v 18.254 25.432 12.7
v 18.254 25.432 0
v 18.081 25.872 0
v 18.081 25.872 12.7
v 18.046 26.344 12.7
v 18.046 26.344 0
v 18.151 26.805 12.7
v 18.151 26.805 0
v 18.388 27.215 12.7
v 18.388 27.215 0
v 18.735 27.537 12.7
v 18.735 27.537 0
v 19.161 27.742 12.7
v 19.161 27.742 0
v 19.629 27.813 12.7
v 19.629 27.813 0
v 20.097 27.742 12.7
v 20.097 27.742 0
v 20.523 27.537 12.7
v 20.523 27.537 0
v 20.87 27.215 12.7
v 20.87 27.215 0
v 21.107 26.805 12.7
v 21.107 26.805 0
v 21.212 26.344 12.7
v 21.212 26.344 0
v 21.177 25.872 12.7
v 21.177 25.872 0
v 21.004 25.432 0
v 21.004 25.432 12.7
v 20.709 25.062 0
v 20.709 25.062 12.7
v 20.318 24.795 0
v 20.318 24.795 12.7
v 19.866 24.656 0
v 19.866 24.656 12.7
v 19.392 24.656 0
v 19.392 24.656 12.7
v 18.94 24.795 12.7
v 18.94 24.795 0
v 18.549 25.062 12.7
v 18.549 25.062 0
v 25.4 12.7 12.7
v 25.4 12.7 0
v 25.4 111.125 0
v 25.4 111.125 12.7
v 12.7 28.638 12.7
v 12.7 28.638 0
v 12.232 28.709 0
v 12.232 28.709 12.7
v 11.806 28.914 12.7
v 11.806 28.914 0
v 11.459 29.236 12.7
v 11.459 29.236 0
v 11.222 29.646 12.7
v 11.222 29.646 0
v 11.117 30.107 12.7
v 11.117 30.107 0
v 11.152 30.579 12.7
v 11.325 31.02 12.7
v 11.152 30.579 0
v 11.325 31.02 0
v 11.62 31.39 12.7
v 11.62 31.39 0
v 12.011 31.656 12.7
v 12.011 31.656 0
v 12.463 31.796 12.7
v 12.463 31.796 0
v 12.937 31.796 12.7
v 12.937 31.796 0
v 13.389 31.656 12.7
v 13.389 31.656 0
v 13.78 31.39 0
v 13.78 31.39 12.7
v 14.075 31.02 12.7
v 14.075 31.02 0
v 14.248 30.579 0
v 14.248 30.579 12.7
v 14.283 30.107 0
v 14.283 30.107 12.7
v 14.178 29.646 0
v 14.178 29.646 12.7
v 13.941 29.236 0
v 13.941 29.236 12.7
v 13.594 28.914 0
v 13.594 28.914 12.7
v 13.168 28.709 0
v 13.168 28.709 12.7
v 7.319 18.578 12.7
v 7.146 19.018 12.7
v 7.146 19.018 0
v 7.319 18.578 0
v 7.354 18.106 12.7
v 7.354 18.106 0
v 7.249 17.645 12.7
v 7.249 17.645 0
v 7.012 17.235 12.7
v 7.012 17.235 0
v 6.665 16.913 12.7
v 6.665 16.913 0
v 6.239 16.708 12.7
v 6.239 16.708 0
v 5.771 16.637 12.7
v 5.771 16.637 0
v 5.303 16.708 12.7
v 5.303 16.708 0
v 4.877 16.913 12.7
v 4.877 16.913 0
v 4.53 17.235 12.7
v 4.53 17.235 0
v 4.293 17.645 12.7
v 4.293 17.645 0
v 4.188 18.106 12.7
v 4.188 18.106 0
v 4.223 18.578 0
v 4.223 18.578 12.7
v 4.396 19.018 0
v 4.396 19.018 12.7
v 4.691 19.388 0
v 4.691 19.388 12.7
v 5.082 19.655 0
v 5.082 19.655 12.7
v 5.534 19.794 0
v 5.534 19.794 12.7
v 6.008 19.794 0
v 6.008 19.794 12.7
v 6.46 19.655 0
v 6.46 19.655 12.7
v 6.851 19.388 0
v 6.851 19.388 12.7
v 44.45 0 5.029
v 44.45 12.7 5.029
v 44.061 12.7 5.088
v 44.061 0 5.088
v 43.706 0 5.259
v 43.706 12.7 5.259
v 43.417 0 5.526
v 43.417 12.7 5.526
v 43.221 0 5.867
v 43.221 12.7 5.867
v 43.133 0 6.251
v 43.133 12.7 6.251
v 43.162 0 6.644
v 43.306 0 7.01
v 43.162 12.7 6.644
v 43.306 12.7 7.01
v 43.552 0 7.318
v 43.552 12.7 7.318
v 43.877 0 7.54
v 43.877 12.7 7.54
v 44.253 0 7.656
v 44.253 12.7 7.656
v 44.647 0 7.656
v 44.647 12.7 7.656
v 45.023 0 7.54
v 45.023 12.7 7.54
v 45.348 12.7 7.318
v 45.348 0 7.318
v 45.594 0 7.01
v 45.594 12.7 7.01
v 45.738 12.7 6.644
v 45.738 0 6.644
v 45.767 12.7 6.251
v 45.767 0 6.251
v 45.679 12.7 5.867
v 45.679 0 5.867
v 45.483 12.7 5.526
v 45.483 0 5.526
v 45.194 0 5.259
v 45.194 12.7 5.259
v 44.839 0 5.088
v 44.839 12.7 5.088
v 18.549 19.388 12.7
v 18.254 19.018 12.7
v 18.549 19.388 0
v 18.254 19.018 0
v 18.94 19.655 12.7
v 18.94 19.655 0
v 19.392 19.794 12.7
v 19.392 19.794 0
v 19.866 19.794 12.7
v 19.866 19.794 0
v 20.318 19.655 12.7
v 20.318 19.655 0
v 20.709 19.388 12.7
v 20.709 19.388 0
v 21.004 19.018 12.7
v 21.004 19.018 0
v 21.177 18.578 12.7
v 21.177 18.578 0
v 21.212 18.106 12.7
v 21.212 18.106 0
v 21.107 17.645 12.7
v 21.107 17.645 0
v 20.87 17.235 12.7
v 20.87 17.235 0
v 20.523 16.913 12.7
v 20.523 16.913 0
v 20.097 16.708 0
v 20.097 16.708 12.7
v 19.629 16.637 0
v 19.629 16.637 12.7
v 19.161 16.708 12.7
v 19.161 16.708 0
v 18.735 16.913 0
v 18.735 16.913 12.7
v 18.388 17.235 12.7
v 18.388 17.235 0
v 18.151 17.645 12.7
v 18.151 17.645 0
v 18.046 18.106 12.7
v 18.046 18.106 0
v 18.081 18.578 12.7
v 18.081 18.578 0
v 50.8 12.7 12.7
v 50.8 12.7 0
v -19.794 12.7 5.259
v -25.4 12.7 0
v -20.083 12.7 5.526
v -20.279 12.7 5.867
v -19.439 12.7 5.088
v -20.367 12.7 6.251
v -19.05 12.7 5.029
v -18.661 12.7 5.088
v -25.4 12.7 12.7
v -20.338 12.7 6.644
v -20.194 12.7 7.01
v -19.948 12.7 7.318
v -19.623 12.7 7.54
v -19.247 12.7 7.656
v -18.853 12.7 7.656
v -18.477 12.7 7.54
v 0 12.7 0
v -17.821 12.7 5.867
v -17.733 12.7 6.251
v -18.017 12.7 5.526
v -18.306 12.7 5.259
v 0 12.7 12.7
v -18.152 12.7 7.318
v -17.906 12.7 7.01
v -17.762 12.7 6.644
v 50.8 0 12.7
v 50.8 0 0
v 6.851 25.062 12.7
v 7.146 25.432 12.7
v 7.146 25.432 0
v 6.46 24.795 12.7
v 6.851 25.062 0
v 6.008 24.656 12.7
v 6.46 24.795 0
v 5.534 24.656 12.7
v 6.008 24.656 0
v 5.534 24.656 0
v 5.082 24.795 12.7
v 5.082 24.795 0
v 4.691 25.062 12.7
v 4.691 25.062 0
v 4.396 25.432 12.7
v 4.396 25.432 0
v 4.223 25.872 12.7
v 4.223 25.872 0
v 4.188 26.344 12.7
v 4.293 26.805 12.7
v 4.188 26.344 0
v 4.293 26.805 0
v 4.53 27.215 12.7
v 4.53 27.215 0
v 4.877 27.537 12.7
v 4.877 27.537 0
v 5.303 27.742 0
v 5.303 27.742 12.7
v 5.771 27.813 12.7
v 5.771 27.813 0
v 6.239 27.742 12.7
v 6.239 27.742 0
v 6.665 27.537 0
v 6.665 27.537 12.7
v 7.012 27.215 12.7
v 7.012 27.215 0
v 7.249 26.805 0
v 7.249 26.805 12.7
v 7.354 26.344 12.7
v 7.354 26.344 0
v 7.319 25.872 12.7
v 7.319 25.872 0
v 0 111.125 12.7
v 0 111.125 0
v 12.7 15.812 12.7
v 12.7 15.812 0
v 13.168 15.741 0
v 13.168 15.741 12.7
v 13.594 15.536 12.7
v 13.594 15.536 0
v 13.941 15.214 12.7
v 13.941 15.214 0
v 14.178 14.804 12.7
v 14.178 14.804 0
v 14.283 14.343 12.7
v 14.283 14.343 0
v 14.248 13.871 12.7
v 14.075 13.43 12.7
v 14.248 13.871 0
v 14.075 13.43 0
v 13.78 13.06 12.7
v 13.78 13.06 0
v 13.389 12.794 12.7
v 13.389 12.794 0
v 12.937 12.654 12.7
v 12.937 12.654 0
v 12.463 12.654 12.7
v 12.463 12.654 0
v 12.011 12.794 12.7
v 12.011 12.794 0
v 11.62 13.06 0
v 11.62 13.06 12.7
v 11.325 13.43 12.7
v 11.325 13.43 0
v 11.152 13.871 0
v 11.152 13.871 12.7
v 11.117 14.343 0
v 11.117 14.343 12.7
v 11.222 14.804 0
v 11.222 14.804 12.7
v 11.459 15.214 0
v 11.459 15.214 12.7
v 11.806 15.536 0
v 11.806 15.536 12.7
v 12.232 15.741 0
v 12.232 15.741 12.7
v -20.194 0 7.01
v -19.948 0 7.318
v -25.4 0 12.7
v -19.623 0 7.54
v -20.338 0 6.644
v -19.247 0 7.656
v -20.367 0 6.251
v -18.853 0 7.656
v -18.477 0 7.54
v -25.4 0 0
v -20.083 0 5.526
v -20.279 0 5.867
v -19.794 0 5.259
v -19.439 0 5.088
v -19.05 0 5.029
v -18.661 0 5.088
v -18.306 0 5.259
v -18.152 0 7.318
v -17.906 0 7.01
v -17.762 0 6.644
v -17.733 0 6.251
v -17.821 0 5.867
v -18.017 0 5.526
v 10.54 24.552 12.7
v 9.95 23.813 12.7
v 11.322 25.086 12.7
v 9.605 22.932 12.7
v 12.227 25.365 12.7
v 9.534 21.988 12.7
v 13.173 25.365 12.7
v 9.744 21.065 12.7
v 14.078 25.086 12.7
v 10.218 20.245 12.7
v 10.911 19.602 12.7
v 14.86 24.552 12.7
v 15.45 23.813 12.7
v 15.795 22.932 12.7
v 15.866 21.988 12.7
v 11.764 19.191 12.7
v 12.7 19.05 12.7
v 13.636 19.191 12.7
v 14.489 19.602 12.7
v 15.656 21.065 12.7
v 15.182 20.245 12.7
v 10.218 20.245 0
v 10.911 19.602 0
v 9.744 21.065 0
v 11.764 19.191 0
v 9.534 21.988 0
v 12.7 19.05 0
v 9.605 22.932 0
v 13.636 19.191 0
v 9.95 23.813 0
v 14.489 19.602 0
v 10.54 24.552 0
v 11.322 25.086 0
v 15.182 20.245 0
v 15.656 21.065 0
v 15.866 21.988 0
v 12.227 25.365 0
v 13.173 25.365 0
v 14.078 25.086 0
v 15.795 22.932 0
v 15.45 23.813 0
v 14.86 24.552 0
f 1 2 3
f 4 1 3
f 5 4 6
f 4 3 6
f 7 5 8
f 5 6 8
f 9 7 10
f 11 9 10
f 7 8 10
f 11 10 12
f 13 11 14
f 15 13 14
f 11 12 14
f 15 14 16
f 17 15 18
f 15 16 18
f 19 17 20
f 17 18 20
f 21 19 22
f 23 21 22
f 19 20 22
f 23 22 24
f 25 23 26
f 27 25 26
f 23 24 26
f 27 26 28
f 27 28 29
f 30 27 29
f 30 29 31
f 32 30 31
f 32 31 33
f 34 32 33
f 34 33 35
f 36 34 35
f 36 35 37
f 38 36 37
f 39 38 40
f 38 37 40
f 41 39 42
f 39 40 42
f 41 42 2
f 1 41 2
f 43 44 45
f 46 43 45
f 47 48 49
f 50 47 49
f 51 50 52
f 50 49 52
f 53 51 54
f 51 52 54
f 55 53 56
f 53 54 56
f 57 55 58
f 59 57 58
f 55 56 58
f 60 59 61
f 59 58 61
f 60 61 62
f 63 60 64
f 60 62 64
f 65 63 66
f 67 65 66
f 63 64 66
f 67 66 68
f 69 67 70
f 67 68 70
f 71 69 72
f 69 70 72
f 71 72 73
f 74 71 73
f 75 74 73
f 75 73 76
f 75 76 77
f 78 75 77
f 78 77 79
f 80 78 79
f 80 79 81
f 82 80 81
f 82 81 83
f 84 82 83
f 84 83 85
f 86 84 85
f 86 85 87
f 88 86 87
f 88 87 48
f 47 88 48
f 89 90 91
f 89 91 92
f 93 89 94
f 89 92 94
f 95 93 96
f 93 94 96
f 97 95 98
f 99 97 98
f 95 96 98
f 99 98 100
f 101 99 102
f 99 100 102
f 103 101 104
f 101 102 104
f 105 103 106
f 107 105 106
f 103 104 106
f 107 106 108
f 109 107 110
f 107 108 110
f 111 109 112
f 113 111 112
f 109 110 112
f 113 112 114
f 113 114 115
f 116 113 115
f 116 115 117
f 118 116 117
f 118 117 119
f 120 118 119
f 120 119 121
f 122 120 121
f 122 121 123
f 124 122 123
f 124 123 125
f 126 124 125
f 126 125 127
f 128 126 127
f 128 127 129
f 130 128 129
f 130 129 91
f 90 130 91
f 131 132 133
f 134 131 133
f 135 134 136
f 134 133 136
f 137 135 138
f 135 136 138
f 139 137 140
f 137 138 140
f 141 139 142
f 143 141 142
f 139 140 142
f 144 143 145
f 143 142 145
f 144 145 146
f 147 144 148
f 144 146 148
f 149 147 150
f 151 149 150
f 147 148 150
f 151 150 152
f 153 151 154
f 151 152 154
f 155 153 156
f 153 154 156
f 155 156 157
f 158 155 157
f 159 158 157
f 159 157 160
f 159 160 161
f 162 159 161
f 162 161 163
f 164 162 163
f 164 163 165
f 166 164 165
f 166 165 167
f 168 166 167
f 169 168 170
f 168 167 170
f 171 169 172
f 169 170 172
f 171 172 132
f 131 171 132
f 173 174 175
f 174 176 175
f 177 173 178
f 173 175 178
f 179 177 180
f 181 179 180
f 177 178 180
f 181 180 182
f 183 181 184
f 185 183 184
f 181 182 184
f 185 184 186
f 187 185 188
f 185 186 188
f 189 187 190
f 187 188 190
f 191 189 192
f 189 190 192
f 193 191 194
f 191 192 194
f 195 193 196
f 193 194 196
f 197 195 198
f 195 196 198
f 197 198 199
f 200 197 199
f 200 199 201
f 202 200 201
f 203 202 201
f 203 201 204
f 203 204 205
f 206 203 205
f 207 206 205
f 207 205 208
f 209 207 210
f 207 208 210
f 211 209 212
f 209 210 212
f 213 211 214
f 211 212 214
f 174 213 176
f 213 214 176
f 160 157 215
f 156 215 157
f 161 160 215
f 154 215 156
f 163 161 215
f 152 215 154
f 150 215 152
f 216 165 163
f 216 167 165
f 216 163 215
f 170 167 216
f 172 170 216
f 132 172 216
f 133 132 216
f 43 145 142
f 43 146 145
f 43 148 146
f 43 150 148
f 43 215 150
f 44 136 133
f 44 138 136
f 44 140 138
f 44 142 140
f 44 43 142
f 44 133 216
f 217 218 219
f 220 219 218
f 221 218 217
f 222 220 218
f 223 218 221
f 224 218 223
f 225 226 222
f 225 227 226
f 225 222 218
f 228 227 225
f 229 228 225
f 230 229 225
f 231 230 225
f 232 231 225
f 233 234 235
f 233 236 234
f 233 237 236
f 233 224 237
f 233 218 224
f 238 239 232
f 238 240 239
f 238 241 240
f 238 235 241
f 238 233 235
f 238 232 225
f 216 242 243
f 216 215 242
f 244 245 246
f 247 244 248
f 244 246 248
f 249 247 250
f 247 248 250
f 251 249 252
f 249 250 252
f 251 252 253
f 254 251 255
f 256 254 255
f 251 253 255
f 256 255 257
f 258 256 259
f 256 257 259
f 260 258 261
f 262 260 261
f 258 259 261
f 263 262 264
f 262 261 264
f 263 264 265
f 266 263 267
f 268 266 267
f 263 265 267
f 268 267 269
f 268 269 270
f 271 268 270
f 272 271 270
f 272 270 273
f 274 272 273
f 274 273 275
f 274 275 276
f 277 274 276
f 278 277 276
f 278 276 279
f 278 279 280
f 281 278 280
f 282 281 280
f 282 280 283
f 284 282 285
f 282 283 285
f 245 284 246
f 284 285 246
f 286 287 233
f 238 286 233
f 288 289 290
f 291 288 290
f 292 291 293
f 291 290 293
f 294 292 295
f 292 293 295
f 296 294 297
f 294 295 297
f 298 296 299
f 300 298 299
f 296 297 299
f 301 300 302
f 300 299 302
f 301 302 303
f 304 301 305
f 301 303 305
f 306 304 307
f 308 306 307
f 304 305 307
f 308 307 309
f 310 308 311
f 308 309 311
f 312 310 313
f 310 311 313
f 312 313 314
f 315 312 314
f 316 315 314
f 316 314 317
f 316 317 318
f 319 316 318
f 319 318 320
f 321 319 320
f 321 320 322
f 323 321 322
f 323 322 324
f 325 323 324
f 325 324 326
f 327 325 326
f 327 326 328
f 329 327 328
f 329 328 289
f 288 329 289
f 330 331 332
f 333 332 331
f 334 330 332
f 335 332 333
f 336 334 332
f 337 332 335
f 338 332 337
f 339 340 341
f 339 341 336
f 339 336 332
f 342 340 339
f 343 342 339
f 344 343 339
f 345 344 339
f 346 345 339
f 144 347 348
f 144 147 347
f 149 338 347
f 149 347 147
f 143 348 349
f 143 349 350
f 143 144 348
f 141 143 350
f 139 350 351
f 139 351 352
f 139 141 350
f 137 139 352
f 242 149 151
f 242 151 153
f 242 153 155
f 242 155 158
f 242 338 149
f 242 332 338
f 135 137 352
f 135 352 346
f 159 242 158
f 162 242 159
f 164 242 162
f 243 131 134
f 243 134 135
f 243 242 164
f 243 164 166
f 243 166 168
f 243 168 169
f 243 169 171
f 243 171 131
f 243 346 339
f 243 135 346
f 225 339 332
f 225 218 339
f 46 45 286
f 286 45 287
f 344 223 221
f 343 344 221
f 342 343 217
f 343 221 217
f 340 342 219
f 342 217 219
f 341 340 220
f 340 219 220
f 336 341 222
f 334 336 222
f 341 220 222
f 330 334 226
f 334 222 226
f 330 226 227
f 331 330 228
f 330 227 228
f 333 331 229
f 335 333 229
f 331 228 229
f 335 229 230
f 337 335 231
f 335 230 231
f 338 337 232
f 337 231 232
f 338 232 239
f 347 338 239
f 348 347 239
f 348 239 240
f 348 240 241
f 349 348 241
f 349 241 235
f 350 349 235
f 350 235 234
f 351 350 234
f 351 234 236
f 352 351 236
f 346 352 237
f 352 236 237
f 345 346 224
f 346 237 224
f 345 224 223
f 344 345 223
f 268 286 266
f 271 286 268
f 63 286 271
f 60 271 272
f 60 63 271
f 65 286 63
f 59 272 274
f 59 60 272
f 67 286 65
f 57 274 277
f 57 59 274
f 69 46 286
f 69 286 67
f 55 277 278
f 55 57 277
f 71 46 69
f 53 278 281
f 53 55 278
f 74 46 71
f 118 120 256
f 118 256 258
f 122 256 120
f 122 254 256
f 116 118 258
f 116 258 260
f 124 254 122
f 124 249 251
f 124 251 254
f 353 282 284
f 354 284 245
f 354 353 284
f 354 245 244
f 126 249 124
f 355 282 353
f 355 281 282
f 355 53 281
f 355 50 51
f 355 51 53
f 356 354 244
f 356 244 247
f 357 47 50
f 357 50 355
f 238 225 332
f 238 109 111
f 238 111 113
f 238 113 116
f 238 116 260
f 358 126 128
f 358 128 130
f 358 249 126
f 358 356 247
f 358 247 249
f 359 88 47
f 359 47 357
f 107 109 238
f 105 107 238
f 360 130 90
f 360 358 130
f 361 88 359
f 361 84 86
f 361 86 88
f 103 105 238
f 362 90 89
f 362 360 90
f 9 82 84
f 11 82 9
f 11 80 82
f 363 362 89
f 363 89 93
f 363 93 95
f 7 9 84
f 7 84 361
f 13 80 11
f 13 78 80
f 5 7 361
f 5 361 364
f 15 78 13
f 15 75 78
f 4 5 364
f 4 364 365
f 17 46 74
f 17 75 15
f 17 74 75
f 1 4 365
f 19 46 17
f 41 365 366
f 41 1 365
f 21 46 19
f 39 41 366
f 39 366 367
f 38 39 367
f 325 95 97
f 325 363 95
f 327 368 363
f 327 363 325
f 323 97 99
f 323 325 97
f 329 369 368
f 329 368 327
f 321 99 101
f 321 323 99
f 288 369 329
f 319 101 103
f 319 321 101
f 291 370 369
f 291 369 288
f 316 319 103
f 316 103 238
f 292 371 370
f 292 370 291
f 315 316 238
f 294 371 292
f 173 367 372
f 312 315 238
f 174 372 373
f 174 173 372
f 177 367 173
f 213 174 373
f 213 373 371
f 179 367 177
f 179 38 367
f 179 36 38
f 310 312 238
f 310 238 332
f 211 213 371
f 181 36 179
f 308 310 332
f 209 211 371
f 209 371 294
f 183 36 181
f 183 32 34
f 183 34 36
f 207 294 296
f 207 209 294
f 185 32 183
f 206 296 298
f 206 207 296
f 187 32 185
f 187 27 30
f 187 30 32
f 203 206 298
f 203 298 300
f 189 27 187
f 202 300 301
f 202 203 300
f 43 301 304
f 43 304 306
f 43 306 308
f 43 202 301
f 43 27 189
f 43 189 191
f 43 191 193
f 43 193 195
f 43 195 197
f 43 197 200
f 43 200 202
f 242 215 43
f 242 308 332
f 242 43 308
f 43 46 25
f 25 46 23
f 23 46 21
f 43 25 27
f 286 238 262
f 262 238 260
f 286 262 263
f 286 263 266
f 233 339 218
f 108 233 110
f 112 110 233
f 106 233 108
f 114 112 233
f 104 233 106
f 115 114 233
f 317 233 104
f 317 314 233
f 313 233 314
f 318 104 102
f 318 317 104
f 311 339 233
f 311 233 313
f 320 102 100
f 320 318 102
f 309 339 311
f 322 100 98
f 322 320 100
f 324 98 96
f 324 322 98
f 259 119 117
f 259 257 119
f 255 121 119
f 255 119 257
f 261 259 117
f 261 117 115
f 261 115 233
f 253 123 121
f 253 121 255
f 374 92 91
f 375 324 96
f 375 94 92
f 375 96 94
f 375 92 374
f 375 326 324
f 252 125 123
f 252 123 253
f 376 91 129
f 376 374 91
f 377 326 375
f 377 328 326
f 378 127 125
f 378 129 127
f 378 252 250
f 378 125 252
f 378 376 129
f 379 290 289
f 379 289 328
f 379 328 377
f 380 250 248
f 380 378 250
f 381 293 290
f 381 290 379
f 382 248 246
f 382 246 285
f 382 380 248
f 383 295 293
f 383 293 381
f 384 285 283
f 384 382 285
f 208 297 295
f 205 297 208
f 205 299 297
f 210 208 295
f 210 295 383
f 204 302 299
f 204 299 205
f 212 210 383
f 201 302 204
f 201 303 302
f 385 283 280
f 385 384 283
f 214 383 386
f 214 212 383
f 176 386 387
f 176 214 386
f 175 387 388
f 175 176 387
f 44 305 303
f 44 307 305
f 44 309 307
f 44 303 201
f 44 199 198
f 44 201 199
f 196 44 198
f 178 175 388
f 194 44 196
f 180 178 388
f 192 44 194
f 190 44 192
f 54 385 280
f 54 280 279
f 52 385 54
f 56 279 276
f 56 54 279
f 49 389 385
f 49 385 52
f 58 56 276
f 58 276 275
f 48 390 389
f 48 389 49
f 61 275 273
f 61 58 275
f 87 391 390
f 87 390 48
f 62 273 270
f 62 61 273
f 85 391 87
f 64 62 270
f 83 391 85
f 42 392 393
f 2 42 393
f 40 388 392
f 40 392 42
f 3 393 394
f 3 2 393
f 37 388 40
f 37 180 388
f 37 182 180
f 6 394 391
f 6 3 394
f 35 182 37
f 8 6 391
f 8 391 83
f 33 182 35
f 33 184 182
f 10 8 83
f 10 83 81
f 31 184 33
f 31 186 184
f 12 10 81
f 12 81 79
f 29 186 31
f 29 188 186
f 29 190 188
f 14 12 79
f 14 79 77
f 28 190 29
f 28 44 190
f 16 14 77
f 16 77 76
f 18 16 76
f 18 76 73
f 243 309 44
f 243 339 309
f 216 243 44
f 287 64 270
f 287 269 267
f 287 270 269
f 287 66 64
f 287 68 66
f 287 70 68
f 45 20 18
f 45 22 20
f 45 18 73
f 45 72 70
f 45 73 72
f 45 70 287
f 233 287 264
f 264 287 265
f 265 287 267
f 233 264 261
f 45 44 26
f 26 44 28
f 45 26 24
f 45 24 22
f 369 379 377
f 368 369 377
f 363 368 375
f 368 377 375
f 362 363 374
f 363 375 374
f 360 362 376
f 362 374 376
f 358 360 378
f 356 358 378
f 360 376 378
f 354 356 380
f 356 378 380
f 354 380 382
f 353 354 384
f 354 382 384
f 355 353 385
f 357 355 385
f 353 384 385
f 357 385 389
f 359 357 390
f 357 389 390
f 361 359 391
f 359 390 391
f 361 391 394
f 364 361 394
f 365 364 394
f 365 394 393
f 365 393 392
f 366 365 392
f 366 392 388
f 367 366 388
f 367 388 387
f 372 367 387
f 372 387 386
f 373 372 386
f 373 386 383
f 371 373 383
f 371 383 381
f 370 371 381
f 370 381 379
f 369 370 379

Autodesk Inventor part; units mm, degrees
ref_plane "YZ Plane" through (0, 0, 0) normal (1, 0, 0) x (0, 1, 0)
ref_plane "XZ Plane" through (0, 0, 0) normal (0, 1, 0) x (-1, 0, 0)
sketch "Sketch1" plane through (0, 0, 0) normal (0, 0, 1) x (1, 0, 0)
  line L0 (0, 0) -> (25.4, 0)
  line L1 (25.4, 0) -> (25.4, 111.125)
  line L2 (25.4, 111.125) -> (0, 111.125)
  line L3 (0, 111.125) -> (0, 0)
  dimension "d0" = 25.4
  dimension "d1" = 111.125
extrude "Extrusion1" add sketch "Sketch1" along normal blind 12.7
sketch "Sketch2" plane through (0, 0, 12.7) normal (0, 0, 1) x (1, 0, 0)
  line L0 (25.4, 111.125) -> (0, 111.125) projected
  line L1 (25.4, 0) -> (25.4, 111.125) projected
  point P0 (0, 0)
  point P1 (12.7, 22.225)
  dimension "d4" = 88.9
  dimension "d5" = 25.4
  dimension "d6" = 12.7
hole "Hole1" at (12.7, 22.225, 12.7) direction (0, 0, -1) diameter 6.35 end through all
sketch "Sketch3" plane through (0, 0, 12.7) normal (0, 0, 1) x (1, 0, 0)
  circle A0 centre (12.7, 22.225) radius 3.175 projected
  line L0 (0, 111.125) -> (0, 0) projected
  point P0 (12.7, 30.226)
  dimension "d14" = 8.001
  dimension "d15" = 12.7
hole "Hole2" at (12.7, 30.226, 12.7) direction (0, 0, -1) diameter 3.175 end through all
pattern_circular "Circular Pattern1" count 6 over 360 about axis through (12.7, 22.225, -101.9962) along (0, 0, 1) of "Hole2"
sketch "Sketch5" plane through (25.4, 0, 0) normal (1, 0, 0) x (0, 0, -1)
  line L0 (0, 0) -> (-12.7, 0) projected
  line L1 (-12.7, 12.6365) -> (-12.7, 15.8115) projected
  line L2 (0, 0) -> (-12.7, 0)
  line L3 (-12.7, 0) -> (-12.7, 12.7)
  line L4 (-12.7, 12.7) -> (0, 12.7)
  line L5 (0, 12.7) -> (0, 0)
  dimension "d26" = 12.7
extrude "Extrusion2" add sketch "Sketch5" along normal blind 25.4
ref_plane "Work Plane1" through (12.7, 111.125, 12.7) normal (1, 0, 0) x (0, 0, -1)
mirror "Mirror1" about plane through (12.7, 111.125, 12.7) normal (1, 0, 0) of "Extrusion2"
sketch "Sketch7" plane through (50.8, 0, 0) normal (0, -1, 0) x (1, 0, 0)
  line L0 (-76.2, 0) -> (0, 0) projected
  line L1 (0, 12.7) -> (0, 0) projected
  line L2 (0, 12.7) -> (-76.2, 12.7) projected
  line L3 (-76.2, 12.7) -> (-76.2, 0) projected
  point P0 (-50.8, 0)
  point P1 (-6.35, 6.35)
  point P2 (-69.85, 6.35)
  dimension "d29" = 12.7
  dimension "d30" = 6.35
  dimension "d31" = 6.35
  dimension "d32" = 6.35
  dimension "d33" = 6.35
hole "Hole3" at (44.45, 0, 6.35) at (-19.05, 0, 6.35) direction (0, 1, 0) diameter 2.6416 end through all thread size "6-32 UNC" class "2B" standard "ANSI Unified Screw Threads"
equation "\"d6\" = 0.5 * d5"
equation "\"d30\" = 0.5 * d29"
equation "\"d31\" = d30"
equation "\"d32\" = d30"
equation "\"d33\" = d31"
properties part number "Motor Block" material "Aluminum 6061"
